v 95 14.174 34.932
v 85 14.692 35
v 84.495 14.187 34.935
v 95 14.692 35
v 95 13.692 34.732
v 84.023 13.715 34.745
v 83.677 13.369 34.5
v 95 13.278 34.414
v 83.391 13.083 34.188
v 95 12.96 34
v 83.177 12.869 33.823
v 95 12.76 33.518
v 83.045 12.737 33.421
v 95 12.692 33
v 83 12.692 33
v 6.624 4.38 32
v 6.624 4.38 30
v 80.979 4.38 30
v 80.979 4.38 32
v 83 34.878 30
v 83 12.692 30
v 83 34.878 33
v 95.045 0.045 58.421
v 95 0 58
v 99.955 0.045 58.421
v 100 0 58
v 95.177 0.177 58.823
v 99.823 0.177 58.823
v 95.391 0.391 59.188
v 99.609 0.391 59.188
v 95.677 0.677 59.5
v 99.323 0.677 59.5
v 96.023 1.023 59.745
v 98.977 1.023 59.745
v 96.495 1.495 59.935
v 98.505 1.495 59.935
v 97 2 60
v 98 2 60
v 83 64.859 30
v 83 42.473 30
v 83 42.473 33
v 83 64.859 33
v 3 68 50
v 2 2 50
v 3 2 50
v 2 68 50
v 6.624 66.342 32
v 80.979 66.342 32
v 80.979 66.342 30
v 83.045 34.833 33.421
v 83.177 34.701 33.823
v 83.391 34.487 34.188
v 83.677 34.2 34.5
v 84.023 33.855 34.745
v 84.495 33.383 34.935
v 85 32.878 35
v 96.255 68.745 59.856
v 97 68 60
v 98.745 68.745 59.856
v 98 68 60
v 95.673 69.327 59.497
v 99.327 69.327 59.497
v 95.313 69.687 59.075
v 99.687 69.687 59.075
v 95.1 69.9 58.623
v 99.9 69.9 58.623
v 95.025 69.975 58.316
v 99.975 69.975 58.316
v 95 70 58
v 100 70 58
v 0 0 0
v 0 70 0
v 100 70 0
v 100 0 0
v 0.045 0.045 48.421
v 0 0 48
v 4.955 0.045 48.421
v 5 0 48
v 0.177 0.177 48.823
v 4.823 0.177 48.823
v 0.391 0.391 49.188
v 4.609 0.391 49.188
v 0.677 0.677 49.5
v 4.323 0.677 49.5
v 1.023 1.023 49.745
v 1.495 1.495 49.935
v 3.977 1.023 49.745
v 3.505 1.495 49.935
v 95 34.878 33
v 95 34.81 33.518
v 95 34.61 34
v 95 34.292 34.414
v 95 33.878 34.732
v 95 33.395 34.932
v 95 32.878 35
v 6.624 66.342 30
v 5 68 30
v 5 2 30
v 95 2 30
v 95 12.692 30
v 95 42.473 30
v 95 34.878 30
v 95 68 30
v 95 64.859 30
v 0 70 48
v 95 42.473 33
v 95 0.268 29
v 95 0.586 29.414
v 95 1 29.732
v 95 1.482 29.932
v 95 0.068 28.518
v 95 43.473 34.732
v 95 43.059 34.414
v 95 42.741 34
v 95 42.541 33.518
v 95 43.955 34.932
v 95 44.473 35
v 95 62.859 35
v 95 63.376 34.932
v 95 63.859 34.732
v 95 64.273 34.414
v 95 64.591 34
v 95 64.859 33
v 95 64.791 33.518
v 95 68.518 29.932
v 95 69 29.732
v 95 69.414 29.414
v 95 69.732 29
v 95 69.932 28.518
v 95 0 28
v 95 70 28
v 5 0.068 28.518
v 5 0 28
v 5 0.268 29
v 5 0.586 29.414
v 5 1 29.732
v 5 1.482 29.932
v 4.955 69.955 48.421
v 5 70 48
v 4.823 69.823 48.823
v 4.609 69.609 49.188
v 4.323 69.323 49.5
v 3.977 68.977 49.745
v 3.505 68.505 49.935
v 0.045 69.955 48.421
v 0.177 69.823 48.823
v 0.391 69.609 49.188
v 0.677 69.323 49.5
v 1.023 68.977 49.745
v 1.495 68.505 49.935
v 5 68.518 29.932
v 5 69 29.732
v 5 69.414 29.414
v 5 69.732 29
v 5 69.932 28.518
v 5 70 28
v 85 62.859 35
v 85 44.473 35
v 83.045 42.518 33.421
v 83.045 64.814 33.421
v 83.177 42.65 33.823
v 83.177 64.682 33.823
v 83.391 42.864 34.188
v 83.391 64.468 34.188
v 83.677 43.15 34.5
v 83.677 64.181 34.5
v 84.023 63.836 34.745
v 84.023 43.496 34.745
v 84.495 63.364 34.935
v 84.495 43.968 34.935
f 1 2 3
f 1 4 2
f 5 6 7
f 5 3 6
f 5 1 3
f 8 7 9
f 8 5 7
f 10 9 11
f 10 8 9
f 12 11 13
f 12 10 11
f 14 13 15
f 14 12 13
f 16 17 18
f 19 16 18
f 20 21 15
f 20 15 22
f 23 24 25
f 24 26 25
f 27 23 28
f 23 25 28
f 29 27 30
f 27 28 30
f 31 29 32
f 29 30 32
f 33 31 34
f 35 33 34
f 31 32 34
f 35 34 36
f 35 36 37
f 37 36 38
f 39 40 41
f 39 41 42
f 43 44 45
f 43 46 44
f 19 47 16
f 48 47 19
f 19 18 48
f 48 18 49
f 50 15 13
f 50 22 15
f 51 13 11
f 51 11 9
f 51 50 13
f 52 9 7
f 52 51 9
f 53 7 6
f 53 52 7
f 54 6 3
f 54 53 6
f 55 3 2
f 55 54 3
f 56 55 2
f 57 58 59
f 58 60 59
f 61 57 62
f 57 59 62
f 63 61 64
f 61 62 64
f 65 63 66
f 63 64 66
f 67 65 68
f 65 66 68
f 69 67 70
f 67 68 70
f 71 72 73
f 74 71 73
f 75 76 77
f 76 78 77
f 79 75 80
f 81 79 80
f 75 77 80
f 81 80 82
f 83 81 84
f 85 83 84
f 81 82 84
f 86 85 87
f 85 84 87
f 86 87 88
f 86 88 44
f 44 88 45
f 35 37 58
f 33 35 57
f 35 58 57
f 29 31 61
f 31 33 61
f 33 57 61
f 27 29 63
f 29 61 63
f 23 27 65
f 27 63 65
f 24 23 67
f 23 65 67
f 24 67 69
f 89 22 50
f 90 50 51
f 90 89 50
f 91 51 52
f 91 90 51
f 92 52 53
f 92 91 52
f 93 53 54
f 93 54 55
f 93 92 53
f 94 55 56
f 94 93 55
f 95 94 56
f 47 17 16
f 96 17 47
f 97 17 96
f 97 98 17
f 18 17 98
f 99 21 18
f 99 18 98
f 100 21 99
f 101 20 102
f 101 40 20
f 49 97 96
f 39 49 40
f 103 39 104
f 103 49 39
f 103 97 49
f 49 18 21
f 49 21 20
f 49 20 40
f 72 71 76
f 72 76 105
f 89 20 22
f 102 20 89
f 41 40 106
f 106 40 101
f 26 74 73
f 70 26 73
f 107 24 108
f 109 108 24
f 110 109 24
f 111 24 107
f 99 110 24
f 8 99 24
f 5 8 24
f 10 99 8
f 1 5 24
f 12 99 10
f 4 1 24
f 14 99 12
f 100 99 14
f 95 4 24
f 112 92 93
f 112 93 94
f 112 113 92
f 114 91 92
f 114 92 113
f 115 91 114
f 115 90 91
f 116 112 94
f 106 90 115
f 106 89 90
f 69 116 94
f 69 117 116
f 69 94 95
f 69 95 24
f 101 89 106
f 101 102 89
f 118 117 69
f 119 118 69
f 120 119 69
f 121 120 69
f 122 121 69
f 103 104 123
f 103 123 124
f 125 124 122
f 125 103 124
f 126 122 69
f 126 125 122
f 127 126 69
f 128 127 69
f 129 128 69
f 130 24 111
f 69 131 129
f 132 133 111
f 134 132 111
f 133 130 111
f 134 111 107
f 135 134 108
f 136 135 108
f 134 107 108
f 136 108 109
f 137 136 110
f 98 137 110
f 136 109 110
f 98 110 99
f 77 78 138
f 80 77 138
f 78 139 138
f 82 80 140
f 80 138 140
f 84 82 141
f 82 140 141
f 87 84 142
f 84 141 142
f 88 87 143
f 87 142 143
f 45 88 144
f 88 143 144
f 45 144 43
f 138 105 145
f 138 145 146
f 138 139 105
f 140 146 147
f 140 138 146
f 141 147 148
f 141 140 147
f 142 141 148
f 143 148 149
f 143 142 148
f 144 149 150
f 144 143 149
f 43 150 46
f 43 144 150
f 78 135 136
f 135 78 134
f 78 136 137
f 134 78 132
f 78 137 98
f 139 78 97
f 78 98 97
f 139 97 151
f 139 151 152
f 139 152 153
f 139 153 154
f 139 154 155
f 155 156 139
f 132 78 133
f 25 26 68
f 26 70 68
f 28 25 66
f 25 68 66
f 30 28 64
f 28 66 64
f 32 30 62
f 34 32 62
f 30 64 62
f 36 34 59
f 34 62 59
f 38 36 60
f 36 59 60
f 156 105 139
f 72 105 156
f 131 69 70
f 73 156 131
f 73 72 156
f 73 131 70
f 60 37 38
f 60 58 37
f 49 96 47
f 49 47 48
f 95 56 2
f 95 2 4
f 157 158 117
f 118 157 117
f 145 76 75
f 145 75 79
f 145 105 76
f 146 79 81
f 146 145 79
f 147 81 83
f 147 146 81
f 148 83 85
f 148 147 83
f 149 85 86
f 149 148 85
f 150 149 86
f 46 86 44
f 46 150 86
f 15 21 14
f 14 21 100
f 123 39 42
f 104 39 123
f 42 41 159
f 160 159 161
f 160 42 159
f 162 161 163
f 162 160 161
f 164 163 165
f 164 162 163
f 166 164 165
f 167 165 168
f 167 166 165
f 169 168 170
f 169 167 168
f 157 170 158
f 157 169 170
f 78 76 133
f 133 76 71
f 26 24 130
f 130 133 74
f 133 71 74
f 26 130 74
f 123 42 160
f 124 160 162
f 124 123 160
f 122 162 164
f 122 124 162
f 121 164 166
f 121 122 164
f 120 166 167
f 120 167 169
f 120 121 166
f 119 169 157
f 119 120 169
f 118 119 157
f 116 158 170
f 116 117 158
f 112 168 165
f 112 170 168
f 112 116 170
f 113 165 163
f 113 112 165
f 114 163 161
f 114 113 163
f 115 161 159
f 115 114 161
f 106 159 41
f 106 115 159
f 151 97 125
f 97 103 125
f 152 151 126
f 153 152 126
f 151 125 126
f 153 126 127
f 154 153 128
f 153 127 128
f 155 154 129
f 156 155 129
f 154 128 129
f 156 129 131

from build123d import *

# Parameters (mm, degrees)
F0_W      = 100
F0_H      = 70
F1_DEPTH  = 30
F2_W      = 5
F2_H      = 70
F3_DEPTH  = 30
F4_W      = 12
F4_H      = 22.185914
F4_H_2    = 22.385787
F5_DEPTH  = 5
F6_W      = 5
F6_H      = 70
F7_DEPTH  = 20
F8_R      = 2
F9_W      = 74.35465
F9_H      = 61.962207
F10_DEPTH = 2


with BuildPart() as f1:
    # F0 (on Top) → F1 (new body)
    with BuildSketch(Plane.XY):
        with Locations((50, 35)):
            Rectangle(F0_W, F0_H)
    extrude(amount=F1_DEPTH)

    # F2 (on face) → F3 (join)
    with BuildSketch(Plane.XY.offset(30)):
        with Locations((97.5, 35)):
            Rectangle(F2_W, F2_H)
    extrude(amount=F3_DEPTH)

    # F4 (on face) → F5 (join)
    with BuildSketch(Plane.XY.offset(30)):
        with Locations((89, 23.784902)):
            Rectangle(F4_W, F4_H)
        with Locations((89, 53.665931)):
            Rectangle(F4_W, F4_H_2)
    extrude(amount=F5_DEPTH)

    # F6 (on face) → F7 (join)
    with BuildSketch(Plane.XY.offset(30)):
        with Locations((2.5, 35)):
            Rectangle(F6_W, F6_H)
    extrude(amount=F7_DEPTH)

    # F8
    f8_edges = [f1.edges().sort_by_distance(p)[0] for p in [
        (83, 23.784902, 35),
        (89, 12.691945, 35),
        (89, 34.877859, 35),
        (83, 53.66593, 35),
        (89, 42.473037, 35),
        (89, 64.858824, 35),
        (50, 0, 30),
        (50, 70, 30),
        (2.5, 0, 50),
        (2.5, 70, 50),
        (97.5, 0, 60),
        (97.5, 70, 60),
        (95, 35, 60),
        (100, 35, 60),
        (5, 35, 50),
        (0, 35, 50),
    ]]
    fillet(f8_edges, radius=F8_R)

    # F9 (on face) → F10 (join)
    with BuildSketch(Plane.XY.offset(30)):
        with Locations((43.801598, 35.36119)):
            Rectangle(F9_W, F9_H)
    extrude(amount=F10_DEPTH)


solid = f1.part
